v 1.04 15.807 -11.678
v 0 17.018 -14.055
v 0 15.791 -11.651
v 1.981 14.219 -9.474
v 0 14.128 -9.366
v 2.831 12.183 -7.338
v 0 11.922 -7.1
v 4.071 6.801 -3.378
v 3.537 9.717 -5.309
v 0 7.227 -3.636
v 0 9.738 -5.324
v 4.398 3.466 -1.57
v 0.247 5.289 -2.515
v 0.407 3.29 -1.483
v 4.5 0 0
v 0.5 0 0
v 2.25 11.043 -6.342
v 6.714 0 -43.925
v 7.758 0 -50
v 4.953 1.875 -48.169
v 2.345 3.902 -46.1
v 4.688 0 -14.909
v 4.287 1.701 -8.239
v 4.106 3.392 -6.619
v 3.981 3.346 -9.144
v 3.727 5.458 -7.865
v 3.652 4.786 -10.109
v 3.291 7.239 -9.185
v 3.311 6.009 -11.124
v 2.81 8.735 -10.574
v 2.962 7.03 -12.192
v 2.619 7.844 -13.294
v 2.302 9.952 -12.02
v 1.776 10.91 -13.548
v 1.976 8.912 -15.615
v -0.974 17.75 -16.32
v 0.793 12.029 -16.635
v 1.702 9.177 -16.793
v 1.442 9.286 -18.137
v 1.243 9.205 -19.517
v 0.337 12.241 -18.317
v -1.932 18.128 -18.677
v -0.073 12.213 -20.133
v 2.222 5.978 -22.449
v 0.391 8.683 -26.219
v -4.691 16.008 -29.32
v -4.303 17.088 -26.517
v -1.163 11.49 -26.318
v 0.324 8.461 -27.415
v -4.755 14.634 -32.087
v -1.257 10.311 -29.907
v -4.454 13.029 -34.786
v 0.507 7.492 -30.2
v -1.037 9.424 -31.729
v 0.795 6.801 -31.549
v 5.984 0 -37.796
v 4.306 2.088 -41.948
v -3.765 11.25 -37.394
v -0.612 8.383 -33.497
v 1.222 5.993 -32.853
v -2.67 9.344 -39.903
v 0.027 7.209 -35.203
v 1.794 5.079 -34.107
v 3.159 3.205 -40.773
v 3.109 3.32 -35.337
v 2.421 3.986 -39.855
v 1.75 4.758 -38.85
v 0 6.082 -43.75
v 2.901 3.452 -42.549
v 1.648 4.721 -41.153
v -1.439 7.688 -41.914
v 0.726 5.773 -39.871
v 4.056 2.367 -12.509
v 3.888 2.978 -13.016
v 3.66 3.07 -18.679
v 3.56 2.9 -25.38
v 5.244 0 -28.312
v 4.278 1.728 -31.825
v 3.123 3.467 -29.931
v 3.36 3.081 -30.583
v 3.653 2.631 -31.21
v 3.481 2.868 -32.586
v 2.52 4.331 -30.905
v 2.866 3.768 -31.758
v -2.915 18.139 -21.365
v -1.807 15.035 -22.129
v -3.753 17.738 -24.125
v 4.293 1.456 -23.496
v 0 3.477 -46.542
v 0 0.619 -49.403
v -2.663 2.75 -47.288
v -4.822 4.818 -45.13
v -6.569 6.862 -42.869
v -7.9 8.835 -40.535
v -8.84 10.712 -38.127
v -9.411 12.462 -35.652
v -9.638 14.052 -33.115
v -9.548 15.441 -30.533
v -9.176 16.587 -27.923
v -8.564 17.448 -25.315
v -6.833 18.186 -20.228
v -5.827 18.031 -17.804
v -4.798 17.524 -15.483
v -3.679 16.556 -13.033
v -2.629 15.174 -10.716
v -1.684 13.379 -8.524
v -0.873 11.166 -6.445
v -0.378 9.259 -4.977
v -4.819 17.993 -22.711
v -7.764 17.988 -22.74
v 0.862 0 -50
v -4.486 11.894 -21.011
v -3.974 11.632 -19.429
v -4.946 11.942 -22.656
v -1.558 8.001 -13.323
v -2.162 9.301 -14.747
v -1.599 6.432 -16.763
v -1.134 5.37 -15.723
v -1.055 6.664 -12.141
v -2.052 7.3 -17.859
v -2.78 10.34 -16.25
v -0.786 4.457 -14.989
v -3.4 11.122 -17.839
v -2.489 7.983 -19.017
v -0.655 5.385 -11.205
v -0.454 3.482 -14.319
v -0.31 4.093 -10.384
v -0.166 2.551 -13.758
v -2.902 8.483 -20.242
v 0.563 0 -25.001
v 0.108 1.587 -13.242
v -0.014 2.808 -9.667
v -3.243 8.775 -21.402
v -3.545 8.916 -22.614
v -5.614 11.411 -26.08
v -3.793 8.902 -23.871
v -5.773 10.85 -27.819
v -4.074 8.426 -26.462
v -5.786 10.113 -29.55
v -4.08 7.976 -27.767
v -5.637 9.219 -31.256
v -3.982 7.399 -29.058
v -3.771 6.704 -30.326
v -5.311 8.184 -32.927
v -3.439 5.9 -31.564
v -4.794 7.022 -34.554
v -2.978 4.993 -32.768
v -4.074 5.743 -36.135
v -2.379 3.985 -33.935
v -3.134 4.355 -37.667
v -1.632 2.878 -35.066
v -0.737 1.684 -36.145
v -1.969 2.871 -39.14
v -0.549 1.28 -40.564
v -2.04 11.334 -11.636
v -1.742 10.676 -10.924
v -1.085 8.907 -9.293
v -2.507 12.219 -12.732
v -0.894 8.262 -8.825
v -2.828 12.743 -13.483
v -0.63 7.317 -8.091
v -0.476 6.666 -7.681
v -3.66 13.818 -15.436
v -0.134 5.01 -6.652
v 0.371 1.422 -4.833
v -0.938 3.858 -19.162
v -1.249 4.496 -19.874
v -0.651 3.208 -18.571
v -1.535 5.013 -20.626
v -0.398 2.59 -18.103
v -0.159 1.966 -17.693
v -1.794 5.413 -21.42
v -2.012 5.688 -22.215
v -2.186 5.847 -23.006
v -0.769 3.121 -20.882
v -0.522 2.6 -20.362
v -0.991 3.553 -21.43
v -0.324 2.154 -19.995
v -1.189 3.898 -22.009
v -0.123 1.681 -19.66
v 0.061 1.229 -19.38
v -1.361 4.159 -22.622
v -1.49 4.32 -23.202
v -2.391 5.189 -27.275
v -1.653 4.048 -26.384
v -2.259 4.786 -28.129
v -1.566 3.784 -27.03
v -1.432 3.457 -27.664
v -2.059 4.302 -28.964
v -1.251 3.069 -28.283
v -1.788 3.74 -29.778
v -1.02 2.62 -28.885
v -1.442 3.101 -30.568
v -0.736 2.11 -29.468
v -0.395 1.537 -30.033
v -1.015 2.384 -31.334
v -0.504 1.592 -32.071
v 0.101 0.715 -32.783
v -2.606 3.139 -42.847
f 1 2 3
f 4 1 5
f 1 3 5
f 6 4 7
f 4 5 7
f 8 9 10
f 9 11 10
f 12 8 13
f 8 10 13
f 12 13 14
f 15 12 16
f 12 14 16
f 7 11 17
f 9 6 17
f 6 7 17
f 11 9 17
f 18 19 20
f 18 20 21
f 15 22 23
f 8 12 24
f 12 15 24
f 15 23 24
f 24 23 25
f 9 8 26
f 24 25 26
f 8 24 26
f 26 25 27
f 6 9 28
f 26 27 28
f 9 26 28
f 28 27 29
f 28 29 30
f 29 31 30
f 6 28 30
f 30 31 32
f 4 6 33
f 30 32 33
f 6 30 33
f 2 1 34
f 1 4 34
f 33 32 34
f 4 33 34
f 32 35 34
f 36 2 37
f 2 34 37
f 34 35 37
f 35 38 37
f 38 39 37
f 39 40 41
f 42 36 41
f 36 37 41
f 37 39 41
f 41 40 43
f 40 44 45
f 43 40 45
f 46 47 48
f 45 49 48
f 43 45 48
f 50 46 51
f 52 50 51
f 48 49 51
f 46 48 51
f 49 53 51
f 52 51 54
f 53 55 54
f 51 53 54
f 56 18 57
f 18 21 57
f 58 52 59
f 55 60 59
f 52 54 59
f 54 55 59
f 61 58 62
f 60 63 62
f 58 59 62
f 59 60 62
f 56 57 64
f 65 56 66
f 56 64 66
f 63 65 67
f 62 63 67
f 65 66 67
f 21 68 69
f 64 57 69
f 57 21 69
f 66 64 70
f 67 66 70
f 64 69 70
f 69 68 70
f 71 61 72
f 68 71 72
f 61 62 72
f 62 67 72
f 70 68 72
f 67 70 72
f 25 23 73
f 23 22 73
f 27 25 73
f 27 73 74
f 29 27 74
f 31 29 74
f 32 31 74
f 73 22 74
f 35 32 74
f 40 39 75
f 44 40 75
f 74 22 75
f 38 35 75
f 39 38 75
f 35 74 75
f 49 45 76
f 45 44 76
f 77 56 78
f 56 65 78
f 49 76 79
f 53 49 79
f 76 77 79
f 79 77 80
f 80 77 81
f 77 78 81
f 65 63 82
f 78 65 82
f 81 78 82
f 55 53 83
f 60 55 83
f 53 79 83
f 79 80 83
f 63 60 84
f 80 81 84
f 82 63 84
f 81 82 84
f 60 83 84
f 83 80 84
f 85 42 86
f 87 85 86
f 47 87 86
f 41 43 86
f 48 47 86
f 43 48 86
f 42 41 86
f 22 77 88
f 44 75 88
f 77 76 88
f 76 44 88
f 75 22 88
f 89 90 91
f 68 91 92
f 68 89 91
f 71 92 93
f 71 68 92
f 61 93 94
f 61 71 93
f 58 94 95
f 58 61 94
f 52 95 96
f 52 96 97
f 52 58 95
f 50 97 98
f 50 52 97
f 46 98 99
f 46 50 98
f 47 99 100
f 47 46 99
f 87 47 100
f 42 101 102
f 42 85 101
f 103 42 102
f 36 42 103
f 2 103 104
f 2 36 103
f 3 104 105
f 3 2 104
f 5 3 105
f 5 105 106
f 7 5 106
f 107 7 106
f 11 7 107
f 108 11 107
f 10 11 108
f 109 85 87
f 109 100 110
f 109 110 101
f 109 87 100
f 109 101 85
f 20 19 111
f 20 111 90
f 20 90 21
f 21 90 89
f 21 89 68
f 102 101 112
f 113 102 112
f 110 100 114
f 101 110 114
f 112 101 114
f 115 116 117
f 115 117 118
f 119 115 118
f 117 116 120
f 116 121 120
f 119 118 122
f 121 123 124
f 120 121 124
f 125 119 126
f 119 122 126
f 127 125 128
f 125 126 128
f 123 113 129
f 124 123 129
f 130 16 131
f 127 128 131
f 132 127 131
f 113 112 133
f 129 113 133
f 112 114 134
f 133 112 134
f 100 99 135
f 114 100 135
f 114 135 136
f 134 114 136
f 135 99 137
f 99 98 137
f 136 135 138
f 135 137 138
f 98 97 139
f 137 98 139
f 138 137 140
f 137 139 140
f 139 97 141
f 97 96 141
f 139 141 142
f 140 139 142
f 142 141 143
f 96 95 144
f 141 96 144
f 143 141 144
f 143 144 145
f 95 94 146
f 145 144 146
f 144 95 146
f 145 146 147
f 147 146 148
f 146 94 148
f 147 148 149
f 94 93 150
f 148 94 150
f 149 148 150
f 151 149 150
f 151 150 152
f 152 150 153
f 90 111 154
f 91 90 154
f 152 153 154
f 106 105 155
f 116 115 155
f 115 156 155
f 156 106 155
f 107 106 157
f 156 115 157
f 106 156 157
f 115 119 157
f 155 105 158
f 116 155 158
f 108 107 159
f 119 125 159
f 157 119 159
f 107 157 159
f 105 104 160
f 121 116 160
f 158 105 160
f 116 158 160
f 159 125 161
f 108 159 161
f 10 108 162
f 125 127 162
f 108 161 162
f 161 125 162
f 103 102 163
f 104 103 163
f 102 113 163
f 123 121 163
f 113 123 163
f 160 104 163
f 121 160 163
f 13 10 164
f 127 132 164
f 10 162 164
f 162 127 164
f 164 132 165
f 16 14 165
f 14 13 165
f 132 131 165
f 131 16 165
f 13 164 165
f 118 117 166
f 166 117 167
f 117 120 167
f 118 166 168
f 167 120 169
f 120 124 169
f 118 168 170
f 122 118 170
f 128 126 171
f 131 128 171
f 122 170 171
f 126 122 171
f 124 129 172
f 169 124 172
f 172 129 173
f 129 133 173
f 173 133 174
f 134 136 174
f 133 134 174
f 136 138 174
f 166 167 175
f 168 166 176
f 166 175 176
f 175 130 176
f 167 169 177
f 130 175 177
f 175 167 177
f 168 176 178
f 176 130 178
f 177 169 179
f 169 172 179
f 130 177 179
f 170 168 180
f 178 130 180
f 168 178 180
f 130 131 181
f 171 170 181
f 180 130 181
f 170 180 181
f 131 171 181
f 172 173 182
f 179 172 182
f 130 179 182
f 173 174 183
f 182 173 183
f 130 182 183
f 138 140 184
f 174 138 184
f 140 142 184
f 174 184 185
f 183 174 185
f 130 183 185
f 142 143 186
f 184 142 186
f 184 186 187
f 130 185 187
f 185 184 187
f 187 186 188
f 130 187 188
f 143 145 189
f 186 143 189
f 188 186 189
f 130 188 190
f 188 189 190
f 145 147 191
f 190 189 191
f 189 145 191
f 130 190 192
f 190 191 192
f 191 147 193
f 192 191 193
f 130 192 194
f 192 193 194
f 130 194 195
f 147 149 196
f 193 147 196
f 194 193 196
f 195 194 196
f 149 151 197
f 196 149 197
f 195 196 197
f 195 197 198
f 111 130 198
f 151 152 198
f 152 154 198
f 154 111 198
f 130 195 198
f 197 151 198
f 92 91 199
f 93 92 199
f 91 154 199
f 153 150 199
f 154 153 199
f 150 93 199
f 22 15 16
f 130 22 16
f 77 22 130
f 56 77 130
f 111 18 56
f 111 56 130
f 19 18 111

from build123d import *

# Parameters (mm, degrees)
SWEEP_1_PITCH       = 330
SWEEP_1_HEIGHT      = 60
SWEEP_1_RADIUS      = 2.5
SWEEP_1_START_ANGLE = 180
SKETCH_3_W          = 4
SKETCH_3_H          = 46
CUT_EXTRUDE_1_DEPTH = 21
CUT_EXTRUDE_2_DEPTH = 98.5


with BuildPart() as part:
    # 扫描1: sweep along a helix
    with BuildLine() as sweep_1_path:
        add(Helix(SWEEP_1_PITCH, SWEEP_1_HEIGHT, SWEEP_1_RADIUS, center=(0, 0, 0), direction=(0, 0, -1), lefthand=True, mode=Mode.PRIVATE).rotate(Axis((0, 0, 0), (0, 0, -1)), SWEEP_1_START_ANGLE))
    # 草图3 → 扫描1 (sweep)
    with BuildSketch(Plane.XY):
        with Locations((2.5, 0)):
            Rectangle(SKETCH_3_W, SKETCH_3_H)
    sweep(path=sweep_1_path.line, is_frenet=True)

    # 草图5 → 切除-拉伸1 (cut, symmetric)
    with BuildSketch(Plane(origin=(0, 0, 0), x_dir=(0, 0, -1), z_dir=(1, 0, 0))):
        with BuildLine():
            Line((50, 0), (145.717687223, 0))
            Line((145.717687223, 0), (145.717687223, 81.76666886))
            Line((145.717687223, 81.76666886), (-35.18191624, 81.76666886))
            Line((-35.18191624, 81.76666886), (-35.18191624, 0))
            Line((-35.18191624, 0), (0, 0))
            add(Edge.make_bspline(
                [(50, 0), (15.152963125, 36.372992503), (0, 0)],
                knots=[0, 0, 0, 1, 1, 1], degree=2))
        make_face()
    extrude(amount=CUT_EXTRUDE_1_DEPTH, both=True, mode=Mode.SUBTRACT)

    # 草图6 → 切除-拉伸2 (cut, symmetric)
    with BuildSketch(Plane(origin=(0, 0, 0), x_dir=(0, 0, -1), z_dir=(1, 0, 0))):
        with BuildLine():
            Line((0, 0), (71.627934589, 0))
            ThreePointArc((71.627934589, 0), (59.599015938, -39.70893354), (27.556474365, -66.067420149))
            Line((27.556474365, -66.067420149), (-48.82479627, -55.196148728))
            Line((-48.82479627, -55.196148728), (0, 0))
        make_face()
    extrude(amount=CUT_EXTRUDE_2_DEPTH, both=True, mode=Mode.SUBTRACT)


solid = part.part
